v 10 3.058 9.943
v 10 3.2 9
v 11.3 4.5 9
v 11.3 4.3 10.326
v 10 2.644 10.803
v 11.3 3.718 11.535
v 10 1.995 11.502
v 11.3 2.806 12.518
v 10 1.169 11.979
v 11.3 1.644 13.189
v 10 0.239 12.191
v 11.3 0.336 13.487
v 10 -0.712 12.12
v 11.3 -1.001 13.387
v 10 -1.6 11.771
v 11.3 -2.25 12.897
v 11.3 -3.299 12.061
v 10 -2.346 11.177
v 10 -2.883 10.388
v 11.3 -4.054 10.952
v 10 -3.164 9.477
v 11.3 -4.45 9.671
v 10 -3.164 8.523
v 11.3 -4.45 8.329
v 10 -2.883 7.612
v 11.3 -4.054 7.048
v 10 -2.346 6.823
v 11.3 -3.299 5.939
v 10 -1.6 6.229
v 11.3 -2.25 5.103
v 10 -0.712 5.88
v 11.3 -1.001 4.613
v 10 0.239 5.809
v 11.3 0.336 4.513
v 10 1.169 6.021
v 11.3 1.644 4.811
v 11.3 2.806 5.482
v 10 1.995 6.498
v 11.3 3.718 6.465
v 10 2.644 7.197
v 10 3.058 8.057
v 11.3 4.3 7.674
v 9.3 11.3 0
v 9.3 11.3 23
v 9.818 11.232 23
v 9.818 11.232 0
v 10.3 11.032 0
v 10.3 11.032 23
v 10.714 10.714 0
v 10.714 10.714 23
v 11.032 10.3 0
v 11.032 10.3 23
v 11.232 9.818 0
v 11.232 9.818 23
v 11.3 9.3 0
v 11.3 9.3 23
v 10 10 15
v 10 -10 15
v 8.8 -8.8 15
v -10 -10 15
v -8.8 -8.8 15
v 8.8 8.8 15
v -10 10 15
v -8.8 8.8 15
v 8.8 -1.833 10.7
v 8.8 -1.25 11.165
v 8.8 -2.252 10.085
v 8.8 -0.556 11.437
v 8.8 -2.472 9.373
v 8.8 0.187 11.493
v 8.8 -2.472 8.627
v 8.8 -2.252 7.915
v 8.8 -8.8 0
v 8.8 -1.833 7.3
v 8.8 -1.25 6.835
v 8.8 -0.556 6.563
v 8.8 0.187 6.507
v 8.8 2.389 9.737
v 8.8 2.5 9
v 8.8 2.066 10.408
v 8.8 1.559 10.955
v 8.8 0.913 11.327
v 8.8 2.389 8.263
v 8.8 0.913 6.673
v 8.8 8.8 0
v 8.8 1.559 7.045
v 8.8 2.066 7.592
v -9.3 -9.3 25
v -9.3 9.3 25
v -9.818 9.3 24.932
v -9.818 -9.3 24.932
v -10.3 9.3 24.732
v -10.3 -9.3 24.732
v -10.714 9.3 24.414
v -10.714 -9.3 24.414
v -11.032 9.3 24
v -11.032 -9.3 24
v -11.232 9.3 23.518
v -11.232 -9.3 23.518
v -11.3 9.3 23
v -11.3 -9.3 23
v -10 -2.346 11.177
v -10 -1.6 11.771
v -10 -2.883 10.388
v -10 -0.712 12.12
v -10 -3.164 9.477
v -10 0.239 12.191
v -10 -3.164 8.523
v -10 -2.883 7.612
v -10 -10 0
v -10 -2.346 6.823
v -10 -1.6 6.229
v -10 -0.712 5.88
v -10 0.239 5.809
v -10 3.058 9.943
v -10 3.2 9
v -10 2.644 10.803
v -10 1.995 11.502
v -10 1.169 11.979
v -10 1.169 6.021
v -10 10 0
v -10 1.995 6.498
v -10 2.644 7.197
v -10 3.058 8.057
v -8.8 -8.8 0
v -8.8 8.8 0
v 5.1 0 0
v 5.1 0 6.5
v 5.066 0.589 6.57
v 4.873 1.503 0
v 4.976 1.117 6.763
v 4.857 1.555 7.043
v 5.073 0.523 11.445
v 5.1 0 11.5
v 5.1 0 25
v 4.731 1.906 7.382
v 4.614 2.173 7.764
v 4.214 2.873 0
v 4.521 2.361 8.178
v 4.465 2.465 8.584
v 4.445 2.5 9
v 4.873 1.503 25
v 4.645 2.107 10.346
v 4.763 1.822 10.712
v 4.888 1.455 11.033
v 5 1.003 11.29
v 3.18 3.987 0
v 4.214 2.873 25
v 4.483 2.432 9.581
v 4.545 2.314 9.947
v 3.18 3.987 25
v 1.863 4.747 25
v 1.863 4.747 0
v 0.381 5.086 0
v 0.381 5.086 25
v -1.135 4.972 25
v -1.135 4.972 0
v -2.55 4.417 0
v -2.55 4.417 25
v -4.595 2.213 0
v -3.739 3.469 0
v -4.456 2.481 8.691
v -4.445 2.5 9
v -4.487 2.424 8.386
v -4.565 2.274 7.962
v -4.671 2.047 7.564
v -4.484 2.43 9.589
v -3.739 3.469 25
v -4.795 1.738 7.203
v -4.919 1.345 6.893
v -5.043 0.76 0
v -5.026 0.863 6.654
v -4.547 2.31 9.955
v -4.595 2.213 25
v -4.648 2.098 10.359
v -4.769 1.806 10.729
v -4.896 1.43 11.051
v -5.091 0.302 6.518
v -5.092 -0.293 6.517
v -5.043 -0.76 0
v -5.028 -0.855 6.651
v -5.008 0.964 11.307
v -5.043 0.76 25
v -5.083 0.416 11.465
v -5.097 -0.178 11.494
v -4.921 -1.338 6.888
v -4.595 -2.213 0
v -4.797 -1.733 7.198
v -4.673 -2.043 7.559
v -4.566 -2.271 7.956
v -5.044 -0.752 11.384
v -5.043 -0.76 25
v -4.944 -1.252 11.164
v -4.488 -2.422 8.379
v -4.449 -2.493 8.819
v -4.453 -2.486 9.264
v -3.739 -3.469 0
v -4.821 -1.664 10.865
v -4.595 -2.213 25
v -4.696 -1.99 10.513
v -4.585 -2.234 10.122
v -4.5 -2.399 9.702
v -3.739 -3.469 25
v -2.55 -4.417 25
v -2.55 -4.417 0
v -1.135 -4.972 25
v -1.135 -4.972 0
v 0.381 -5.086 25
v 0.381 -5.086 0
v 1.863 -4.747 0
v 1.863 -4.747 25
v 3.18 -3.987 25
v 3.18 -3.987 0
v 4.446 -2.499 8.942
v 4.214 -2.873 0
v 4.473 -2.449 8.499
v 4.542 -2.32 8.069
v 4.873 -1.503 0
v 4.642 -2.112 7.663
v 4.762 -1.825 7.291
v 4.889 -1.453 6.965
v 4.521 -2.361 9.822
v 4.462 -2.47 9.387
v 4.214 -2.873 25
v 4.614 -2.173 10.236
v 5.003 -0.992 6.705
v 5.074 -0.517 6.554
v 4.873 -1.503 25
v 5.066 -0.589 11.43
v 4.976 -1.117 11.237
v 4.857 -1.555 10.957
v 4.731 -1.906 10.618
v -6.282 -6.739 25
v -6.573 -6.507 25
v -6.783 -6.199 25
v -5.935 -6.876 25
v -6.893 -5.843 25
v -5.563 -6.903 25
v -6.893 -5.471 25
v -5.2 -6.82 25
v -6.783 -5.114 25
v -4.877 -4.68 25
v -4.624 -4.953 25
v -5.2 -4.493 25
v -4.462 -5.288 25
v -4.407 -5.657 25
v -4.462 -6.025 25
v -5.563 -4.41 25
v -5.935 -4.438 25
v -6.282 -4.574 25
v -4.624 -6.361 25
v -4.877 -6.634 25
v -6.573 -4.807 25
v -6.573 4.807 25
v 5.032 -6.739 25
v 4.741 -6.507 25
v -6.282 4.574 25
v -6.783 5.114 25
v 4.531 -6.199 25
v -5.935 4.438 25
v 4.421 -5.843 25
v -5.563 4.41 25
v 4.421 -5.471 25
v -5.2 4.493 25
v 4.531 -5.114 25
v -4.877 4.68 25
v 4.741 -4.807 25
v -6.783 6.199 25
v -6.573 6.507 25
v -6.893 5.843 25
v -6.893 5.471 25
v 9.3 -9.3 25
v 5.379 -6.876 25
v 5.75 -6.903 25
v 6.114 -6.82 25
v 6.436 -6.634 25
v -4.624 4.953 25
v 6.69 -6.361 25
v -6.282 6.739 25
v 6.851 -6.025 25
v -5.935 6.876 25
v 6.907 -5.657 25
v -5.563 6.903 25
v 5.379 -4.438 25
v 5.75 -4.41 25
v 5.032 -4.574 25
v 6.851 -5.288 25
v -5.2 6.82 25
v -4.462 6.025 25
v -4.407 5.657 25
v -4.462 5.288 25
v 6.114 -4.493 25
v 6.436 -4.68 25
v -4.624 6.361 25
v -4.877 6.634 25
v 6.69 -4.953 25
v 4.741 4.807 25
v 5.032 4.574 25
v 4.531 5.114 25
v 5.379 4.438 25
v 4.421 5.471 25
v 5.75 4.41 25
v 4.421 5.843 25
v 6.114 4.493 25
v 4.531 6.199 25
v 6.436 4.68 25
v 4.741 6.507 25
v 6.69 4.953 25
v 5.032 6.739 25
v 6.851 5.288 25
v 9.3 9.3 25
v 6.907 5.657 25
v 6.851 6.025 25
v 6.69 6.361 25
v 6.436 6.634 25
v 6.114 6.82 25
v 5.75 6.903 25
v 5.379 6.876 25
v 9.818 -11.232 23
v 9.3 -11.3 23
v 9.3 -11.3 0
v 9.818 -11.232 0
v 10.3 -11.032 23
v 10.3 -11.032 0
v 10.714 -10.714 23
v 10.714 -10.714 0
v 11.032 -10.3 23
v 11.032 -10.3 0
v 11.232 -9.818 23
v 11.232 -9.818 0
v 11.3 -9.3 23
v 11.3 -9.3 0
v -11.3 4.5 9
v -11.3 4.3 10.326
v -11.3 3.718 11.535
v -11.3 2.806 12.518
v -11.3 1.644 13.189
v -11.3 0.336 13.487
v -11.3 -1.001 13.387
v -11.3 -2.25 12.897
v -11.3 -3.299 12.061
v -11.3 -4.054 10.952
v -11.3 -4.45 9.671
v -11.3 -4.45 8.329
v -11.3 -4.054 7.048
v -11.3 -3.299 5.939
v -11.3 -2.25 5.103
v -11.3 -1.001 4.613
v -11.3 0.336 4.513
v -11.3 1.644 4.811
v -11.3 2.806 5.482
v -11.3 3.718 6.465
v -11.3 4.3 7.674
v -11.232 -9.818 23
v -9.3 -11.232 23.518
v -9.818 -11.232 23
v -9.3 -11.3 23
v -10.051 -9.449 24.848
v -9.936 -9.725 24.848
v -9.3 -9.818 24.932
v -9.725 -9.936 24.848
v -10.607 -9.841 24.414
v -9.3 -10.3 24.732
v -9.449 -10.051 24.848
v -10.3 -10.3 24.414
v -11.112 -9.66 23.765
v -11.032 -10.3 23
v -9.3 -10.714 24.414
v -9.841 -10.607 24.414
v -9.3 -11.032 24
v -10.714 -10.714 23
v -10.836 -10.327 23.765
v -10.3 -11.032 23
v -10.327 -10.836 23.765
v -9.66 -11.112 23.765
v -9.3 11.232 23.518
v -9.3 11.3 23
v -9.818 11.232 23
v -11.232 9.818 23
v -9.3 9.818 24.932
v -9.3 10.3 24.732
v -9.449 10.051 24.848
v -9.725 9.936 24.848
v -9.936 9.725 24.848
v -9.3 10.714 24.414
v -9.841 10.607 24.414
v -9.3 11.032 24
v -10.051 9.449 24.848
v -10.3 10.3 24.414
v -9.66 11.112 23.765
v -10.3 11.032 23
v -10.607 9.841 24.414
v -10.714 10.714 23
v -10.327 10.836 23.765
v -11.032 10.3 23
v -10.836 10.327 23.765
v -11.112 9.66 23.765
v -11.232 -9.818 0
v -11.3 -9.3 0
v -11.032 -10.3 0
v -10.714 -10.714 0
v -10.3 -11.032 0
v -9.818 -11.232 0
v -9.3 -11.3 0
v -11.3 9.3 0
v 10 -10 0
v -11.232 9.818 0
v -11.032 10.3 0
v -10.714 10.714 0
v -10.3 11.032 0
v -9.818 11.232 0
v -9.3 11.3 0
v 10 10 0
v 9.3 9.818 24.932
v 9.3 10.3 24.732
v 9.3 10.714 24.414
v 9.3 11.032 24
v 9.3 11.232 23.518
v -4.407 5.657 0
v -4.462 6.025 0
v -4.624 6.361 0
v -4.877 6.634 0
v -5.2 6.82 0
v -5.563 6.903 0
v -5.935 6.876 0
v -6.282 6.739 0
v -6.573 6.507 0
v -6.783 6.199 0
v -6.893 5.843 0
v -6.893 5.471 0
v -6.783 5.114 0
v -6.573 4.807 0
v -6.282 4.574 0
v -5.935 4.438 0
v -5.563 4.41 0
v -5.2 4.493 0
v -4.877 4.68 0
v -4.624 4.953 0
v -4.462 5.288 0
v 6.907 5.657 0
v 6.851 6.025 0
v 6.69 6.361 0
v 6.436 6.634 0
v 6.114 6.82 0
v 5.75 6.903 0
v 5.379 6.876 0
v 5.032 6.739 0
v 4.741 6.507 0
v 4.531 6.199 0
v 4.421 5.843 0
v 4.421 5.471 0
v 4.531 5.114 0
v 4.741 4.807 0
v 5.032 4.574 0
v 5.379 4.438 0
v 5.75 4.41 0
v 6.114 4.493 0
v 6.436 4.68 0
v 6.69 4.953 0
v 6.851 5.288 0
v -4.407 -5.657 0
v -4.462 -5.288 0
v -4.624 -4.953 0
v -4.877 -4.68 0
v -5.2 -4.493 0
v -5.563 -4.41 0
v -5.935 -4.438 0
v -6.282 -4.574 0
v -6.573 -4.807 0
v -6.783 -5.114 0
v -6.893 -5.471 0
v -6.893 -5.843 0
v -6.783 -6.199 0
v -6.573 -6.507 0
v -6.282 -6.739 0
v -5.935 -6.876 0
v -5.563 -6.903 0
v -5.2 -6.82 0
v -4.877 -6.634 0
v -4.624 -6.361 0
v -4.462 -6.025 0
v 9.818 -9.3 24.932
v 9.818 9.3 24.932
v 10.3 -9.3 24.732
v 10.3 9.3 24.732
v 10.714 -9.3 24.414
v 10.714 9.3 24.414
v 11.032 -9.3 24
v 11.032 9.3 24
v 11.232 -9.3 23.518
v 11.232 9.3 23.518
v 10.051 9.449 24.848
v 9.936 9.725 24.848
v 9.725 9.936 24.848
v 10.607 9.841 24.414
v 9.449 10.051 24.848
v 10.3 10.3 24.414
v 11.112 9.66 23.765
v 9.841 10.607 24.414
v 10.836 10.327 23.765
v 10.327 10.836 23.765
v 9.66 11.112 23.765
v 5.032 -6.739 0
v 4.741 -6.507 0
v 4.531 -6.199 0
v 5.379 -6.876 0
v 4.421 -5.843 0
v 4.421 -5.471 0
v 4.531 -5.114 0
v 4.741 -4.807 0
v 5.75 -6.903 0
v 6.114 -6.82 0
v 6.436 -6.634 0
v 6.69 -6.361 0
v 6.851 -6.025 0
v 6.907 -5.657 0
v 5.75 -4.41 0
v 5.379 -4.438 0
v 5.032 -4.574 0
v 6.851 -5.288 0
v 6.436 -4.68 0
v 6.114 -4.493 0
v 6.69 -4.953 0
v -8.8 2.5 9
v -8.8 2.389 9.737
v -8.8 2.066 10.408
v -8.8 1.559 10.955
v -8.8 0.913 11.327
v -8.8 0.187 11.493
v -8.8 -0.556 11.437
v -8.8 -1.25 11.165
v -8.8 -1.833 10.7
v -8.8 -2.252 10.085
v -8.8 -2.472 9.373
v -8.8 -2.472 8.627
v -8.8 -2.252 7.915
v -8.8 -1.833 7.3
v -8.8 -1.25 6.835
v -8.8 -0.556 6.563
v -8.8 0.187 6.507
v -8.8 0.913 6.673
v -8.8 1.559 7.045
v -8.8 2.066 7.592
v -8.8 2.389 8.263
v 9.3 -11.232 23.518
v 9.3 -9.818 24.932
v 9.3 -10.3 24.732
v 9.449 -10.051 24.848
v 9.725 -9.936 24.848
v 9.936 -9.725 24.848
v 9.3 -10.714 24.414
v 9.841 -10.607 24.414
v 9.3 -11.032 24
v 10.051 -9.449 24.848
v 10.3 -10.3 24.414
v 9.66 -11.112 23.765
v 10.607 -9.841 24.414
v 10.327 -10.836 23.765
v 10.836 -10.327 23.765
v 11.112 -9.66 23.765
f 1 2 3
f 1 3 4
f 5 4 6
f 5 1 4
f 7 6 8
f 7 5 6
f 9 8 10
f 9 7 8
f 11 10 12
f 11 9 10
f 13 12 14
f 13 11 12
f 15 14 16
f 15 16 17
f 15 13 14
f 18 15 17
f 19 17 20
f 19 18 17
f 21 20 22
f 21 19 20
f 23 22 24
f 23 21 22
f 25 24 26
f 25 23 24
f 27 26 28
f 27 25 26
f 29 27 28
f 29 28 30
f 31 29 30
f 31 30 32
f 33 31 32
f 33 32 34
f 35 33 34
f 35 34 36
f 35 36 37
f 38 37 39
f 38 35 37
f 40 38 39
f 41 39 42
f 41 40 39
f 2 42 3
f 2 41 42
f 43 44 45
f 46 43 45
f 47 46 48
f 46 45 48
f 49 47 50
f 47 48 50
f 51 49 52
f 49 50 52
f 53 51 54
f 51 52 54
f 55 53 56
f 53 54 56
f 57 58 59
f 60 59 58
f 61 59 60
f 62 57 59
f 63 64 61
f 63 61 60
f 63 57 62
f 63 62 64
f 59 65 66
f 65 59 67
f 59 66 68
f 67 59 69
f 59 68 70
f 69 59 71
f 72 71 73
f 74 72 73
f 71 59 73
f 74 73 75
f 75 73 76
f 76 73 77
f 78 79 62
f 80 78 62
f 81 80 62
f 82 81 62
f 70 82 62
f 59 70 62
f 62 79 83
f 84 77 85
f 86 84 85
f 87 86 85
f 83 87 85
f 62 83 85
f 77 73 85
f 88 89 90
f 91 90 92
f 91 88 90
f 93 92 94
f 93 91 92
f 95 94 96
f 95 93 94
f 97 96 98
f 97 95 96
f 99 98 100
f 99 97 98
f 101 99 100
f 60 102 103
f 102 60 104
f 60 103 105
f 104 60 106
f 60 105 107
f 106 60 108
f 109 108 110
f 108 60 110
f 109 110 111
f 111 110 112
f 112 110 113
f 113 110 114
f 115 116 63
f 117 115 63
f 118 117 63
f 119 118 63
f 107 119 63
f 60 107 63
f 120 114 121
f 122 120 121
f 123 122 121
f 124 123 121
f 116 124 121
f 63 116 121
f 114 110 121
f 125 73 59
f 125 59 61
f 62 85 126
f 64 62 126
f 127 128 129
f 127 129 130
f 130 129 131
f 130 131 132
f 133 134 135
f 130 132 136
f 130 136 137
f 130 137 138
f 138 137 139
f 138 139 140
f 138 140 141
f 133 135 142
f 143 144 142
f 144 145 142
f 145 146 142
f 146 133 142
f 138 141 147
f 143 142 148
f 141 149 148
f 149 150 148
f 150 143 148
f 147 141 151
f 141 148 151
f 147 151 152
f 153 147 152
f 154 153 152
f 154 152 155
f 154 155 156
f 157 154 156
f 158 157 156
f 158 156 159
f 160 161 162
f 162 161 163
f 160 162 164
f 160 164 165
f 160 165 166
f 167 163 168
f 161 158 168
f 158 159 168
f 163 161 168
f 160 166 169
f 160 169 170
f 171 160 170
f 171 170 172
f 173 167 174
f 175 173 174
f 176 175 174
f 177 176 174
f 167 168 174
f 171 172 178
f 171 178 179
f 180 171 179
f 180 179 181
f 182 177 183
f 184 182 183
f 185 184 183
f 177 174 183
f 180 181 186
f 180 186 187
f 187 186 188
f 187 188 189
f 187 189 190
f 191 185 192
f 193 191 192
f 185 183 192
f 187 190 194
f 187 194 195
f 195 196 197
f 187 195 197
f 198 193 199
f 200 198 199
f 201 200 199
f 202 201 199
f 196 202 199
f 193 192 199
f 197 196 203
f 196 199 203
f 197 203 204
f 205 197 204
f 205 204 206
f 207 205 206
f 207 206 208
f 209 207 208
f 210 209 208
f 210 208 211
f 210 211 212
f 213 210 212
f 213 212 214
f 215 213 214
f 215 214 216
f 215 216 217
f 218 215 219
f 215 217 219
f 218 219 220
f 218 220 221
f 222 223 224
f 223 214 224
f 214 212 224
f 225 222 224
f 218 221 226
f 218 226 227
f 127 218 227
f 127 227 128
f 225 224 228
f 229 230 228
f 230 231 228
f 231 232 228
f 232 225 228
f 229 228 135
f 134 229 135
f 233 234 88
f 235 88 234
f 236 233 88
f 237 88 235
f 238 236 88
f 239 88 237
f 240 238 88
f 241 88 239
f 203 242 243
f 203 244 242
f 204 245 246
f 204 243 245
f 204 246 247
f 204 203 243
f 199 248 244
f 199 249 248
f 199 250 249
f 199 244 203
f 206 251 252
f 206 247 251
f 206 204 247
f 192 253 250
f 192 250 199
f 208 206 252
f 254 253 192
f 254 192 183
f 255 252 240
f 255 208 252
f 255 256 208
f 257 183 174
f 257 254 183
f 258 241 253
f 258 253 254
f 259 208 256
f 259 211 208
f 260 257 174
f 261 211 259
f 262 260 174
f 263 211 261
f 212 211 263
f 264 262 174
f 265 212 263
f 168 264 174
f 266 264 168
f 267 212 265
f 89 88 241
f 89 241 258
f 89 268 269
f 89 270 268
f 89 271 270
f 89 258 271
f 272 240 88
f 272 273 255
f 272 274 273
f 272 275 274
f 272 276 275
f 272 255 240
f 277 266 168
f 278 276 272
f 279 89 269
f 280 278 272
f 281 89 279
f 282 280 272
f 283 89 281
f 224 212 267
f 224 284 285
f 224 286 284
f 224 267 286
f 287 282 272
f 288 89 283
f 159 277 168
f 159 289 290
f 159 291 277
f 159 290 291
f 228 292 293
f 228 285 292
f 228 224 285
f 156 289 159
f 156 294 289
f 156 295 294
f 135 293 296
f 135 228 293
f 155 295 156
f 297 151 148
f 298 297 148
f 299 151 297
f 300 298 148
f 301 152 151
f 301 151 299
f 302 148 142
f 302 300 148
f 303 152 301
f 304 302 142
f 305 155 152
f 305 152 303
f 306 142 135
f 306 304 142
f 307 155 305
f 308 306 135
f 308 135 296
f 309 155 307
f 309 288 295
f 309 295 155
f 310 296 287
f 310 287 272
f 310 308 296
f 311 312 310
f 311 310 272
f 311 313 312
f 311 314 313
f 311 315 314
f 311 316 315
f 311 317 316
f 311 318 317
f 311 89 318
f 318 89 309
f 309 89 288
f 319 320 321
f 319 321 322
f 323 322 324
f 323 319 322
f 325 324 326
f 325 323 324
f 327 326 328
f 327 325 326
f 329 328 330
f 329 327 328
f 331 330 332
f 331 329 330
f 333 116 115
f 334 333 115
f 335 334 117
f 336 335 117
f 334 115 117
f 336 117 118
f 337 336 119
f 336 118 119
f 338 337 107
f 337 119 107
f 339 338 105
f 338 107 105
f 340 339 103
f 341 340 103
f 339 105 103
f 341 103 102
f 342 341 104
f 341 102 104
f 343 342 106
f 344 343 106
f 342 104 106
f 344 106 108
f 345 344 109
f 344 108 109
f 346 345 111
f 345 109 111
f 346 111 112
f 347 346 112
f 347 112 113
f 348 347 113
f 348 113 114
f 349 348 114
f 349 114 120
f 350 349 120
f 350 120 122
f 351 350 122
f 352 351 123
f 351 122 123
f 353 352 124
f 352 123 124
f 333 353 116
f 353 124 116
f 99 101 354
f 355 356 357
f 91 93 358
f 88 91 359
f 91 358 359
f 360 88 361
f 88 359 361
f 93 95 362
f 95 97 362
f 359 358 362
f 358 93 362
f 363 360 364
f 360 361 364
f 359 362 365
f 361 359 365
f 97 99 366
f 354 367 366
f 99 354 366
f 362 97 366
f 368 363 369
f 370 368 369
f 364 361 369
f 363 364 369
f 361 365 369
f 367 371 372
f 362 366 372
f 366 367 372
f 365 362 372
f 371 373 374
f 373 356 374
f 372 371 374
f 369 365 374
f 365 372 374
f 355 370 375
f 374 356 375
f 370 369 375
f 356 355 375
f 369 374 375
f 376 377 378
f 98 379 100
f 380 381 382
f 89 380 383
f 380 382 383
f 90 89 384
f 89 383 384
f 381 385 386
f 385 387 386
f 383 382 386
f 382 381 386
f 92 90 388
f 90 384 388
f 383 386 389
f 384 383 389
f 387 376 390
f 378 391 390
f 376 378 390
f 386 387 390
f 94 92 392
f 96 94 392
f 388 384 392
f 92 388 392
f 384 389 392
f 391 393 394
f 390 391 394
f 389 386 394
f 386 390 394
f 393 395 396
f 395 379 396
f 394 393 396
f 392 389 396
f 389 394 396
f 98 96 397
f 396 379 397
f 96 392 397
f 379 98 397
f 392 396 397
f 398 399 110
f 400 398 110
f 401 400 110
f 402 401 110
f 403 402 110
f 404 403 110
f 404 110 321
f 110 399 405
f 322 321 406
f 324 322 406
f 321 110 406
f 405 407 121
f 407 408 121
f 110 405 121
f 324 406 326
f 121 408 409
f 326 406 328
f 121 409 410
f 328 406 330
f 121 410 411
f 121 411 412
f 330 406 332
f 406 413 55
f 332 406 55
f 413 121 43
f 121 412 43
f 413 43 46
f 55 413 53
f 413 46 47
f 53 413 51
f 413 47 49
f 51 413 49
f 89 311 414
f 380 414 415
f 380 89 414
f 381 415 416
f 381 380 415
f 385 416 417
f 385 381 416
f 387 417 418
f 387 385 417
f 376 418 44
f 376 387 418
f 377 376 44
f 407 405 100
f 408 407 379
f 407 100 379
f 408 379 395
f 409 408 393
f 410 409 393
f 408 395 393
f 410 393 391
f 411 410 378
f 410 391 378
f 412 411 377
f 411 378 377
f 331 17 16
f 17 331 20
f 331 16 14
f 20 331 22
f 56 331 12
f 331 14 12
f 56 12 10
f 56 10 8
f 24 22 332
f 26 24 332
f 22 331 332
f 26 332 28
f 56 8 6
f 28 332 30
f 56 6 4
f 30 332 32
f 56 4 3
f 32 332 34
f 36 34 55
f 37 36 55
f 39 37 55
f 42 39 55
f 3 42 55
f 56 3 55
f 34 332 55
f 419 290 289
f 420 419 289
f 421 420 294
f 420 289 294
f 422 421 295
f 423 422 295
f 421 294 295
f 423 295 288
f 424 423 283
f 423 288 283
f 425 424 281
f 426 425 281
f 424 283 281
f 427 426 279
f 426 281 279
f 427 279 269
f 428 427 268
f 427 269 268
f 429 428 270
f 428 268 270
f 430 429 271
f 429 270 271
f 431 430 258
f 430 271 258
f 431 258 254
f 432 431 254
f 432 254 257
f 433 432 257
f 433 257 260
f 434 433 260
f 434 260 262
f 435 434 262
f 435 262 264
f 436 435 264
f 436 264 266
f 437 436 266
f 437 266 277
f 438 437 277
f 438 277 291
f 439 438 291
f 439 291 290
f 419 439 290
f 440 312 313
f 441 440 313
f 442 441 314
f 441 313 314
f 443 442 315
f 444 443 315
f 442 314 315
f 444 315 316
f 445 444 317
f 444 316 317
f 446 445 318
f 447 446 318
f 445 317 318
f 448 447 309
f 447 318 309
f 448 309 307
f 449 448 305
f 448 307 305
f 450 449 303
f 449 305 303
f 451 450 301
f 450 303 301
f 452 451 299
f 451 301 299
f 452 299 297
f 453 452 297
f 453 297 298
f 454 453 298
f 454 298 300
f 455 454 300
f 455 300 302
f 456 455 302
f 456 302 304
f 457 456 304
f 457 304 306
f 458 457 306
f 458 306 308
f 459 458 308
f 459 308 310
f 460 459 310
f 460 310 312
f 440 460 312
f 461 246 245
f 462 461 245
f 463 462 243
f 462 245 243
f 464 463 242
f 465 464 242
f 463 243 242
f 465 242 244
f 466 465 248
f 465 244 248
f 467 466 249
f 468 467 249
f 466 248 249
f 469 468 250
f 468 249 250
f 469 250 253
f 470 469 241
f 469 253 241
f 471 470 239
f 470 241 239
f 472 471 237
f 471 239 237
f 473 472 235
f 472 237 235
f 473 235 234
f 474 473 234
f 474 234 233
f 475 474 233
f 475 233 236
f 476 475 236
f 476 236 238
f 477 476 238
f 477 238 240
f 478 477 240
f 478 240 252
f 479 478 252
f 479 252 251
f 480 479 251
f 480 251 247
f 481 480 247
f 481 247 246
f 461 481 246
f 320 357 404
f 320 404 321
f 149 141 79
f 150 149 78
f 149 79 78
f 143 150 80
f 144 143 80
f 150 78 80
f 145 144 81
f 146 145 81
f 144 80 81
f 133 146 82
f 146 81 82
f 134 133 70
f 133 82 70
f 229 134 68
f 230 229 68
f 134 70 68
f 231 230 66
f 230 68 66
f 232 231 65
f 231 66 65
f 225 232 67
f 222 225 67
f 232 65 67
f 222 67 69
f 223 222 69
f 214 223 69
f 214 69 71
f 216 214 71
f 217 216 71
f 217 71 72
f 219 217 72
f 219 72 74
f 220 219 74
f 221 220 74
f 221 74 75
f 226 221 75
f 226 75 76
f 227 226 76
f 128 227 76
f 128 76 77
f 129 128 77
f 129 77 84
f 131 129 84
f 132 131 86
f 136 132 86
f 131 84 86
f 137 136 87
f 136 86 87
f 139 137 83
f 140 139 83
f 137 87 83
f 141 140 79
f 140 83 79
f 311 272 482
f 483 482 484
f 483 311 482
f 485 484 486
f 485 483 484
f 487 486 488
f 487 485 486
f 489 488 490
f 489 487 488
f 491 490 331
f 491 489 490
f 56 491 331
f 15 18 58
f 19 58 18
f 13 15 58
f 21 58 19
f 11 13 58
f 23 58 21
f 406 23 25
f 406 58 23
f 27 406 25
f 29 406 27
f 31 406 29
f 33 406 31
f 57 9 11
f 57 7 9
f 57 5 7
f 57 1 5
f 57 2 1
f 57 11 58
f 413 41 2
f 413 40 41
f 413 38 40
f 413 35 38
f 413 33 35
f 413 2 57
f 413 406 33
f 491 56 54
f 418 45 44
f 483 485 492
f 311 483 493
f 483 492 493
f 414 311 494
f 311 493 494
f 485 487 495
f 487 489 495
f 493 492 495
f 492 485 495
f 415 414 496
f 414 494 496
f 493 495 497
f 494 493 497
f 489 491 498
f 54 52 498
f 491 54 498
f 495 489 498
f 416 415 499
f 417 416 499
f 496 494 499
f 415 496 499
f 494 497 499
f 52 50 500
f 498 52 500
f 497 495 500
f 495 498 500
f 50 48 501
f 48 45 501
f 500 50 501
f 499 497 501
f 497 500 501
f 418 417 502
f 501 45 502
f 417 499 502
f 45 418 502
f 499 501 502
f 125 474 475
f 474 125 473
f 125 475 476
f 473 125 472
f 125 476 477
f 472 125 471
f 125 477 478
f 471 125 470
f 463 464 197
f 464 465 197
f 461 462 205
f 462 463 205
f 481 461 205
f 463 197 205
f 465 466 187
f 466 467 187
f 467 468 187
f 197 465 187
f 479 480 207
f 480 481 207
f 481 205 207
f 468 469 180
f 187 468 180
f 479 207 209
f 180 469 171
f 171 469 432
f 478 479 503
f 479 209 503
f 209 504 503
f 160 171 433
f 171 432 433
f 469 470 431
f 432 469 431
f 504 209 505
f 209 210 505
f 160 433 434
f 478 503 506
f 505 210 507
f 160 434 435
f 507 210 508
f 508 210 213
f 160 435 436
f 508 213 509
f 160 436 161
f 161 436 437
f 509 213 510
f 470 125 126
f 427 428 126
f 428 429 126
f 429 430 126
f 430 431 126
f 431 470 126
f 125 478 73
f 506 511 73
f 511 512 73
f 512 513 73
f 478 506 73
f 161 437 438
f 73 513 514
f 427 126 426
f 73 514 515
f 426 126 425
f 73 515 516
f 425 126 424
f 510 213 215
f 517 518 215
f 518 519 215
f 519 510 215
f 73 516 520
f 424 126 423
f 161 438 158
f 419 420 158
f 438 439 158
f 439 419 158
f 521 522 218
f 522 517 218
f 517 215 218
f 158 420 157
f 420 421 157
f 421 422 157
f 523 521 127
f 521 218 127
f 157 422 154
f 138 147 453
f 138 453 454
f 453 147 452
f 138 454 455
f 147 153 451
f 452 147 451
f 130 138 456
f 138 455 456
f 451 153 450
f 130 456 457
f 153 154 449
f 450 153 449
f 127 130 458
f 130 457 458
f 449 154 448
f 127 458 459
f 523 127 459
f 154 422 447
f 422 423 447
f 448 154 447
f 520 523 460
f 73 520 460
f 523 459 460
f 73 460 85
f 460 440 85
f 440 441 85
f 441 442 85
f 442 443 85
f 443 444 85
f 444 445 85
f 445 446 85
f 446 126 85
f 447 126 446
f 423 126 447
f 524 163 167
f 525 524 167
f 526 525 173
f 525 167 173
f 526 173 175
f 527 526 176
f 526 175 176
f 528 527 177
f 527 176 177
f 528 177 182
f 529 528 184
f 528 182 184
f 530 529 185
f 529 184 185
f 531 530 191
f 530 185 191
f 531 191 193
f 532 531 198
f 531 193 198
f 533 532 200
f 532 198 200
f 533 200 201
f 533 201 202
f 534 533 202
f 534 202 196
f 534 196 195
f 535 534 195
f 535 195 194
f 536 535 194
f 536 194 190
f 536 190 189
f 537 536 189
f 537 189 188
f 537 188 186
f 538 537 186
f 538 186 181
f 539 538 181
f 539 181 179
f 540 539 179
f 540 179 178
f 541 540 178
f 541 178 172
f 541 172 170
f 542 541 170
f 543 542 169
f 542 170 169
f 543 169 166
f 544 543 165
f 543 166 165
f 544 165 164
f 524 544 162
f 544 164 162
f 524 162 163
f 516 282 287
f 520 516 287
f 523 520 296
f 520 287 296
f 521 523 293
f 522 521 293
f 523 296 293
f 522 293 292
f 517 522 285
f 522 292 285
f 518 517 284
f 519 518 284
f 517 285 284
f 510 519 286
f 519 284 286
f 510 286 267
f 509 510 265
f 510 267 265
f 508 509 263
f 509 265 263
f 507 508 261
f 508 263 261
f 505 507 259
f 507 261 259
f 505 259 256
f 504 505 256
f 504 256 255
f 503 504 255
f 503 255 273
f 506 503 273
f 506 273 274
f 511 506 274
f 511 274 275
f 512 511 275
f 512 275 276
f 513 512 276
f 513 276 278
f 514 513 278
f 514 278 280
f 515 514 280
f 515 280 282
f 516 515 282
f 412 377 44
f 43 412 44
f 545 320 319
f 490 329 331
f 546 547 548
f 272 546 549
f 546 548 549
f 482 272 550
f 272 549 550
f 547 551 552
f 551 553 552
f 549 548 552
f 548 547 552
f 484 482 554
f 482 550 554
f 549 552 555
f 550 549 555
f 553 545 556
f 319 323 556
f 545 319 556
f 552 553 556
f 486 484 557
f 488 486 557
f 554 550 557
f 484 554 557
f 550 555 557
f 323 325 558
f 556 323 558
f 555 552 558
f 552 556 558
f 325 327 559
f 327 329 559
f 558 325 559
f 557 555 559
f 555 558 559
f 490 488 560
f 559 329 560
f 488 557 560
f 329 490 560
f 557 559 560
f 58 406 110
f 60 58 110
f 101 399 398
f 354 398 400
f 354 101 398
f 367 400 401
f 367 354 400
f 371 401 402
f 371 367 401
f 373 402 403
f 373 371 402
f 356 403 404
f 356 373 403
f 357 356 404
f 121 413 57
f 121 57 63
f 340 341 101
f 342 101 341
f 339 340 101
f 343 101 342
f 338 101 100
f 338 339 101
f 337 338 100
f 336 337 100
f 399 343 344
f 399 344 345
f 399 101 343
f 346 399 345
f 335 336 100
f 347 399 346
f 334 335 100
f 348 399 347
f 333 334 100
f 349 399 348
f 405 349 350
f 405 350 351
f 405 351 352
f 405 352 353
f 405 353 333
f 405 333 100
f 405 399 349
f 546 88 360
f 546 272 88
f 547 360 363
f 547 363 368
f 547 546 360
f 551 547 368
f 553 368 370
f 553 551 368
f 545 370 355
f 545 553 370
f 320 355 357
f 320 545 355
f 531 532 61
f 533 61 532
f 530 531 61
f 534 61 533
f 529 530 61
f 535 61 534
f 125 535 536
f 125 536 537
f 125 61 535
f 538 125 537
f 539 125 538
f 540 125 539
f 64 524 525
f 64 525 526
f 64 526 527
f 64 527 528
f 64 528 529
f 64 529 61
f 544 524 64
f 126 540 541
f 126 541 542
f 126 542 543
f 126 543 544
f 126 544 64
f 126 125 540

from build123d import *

# Parameters (mm, degrees)
CROQUIS1_W              = 22.6
CROQUIS1_H              = 22.6
SALIENTE_EXTRUIR1_DEPTH = 25
CROQUIS2_R              = 5.1
CORTAR_EXTRUIR1_DEPTH   = 30.671198156
CROQUIS3_R              = 1.25
CORTAR_EXTRUIR2_DEPTH   = 30.671198156
CROQUIS4_W              = 20
CROQUIS4_H              = 20
CROQUIS4_W_2            = 17.6
CROQUIS4_H_2            = 17.6
CORTAR_EXTRUIR3_DEPTH   = 15
CROQUIS5_R              = 2.5
CORTAR_EXTRUIR4_DEPTH   = 36.545041848
CHAFL_N1_SIZE           = 2
REDONDEO1_R             = 2
REDONDEO2_R             = 2


with BuildPart() as part:
    # Croquis1 → Saliente-Extruir1 (new body)
    with BuildSketch(Plane.XY):
        Rectangle(CROQUIS1_W, CROQUIS1_H)
    extrude(amount=SALIENTE_EXTRUIR1_DEPTH)

    # Croquis2 → Cortar-Extruir1 (cut, through all)
    with BuildSketch(Plane.XY.offset(25)):
        Circle(CROQUIS2_R)
    extrude(amount=-CORTAR_EXTRUIR1_DEPTH, mode=Mode.SUBTRACT)

    # Croquis3 → Cortar-Extruir2 (cut, through all)
    with BuildSketch(Plane.XY.offset(25)):
        with Locations((5.656854249, 5.656854249)):
            Circle(CROQUIS3_R)
        with Locations((5.656854249, -5.656854249)):
            Circle(CROQUIS3_R)
        with Locations((-5.656854249, -5.656854249)):
            Circle(CROQUIS3_R)
        with Locations((-5.656854249, 5.656854249)):
            Circle(CROQUIS3_R)
    extrude(amount=-CORTAR_EXTRUIR2_DEPTH, mode=Mode.SUBTRACT)

    # Croquis4 → Cortar-Extruir3 (cut)
    with BuildSketch(Plane(origin=(0, 0, 0), x_dir=(-1, 0, 0), z_dir=(0, 0, -1))):
        Rectangle(CROQUIS4_W, CROQUIS4_H)
        Rectangle(CROQUIS4_W_2, CROQUIS4_H_2, mode=Mode.SUBTRACT)
    extrude(amount=-CORTAR_EXTRUIR3_DEPTH, mode=Mode.SUBTRACT)

    # Croquis5 → Cortar-Extruir4 (cut, through all)
    with BuildSketch(Plane(origin=(11.3, 0, 0), x_dir=(0, 0, -1), z_dir=(1, 0, 0))):
        with Locations(Location((-9, 0, 0), (0, 0, 90))):
            Circle(CROQUIS5_R)
    extrude(amount=-CORTAR_EXTRUIR4_DEPTH, mode=Mode.SUBTRACT)

    # Chaflán1
    # the kernel refuses this chamfer: 2 mm, written as the material it takes off along each edge
    with BuildSketch(Plane(origin=(-11.3, 0, 9), x_dir=(0, 1, 0), z_dir=(0, 0, -1))) as chafl_n1_piece_1:
        Polygon((2.5 + CHAFL_N1_SIZE, 0), (2.5, CHAFL_N1_SIZE), (2.5, 0), align=None)
    revolve(axis=Axis((-11.3, 0, 9), (1, 0, 0)), mode=Mode.SUBTRACT)
    with BuildSketch(Plane(origin=(11.3, 0, 9), x_dir=(0, 1, 0), z_dir=(0, 0, -1))) as chafl_n1_piece_2:
        Polygon((2.5 + CHAFL_N1_SIZE, 0), (2.5, -CHAFL_N1_SIZE), (2.5, 0), align=None)
    revolve(axis=Axis((11.3, 0, 9), (1, 0, 0)), mode=Mode.SUBTRACT)

    # Redondeo1
    redondeo1_edges = [part.edges().sort_by_distance(p)[0] for p in [
        (11.3, -11.3, 12.5),
        (-11.3, -11.3, 12.5),
        (-11.3, 11.3, 12.5),
        (11.3, 11.3, 12.5),
    ]]
    fillet(redondeo1_edges, radius=REDONDEO1_R)

    # Redondeo2
    redondeo2_edges = [part.edges().sort_by_distance(p)[0] for p in [
        (0, -11.3, 25),
        (-11.3, 0, 25),
        (11.3, 0, 25),
        (0, 11.3, 25),
        (10.714213562, 10.714213562, 25),
        (-10.714213562, 10.714213562, 25),
        (10.714213562, -10.714213562, 25),
        (-10.714213562, -10.714213562, 25),
    ]]
    fillet(redondeo2_edges, radius=REDONDEO2_R)


solid = part.part
